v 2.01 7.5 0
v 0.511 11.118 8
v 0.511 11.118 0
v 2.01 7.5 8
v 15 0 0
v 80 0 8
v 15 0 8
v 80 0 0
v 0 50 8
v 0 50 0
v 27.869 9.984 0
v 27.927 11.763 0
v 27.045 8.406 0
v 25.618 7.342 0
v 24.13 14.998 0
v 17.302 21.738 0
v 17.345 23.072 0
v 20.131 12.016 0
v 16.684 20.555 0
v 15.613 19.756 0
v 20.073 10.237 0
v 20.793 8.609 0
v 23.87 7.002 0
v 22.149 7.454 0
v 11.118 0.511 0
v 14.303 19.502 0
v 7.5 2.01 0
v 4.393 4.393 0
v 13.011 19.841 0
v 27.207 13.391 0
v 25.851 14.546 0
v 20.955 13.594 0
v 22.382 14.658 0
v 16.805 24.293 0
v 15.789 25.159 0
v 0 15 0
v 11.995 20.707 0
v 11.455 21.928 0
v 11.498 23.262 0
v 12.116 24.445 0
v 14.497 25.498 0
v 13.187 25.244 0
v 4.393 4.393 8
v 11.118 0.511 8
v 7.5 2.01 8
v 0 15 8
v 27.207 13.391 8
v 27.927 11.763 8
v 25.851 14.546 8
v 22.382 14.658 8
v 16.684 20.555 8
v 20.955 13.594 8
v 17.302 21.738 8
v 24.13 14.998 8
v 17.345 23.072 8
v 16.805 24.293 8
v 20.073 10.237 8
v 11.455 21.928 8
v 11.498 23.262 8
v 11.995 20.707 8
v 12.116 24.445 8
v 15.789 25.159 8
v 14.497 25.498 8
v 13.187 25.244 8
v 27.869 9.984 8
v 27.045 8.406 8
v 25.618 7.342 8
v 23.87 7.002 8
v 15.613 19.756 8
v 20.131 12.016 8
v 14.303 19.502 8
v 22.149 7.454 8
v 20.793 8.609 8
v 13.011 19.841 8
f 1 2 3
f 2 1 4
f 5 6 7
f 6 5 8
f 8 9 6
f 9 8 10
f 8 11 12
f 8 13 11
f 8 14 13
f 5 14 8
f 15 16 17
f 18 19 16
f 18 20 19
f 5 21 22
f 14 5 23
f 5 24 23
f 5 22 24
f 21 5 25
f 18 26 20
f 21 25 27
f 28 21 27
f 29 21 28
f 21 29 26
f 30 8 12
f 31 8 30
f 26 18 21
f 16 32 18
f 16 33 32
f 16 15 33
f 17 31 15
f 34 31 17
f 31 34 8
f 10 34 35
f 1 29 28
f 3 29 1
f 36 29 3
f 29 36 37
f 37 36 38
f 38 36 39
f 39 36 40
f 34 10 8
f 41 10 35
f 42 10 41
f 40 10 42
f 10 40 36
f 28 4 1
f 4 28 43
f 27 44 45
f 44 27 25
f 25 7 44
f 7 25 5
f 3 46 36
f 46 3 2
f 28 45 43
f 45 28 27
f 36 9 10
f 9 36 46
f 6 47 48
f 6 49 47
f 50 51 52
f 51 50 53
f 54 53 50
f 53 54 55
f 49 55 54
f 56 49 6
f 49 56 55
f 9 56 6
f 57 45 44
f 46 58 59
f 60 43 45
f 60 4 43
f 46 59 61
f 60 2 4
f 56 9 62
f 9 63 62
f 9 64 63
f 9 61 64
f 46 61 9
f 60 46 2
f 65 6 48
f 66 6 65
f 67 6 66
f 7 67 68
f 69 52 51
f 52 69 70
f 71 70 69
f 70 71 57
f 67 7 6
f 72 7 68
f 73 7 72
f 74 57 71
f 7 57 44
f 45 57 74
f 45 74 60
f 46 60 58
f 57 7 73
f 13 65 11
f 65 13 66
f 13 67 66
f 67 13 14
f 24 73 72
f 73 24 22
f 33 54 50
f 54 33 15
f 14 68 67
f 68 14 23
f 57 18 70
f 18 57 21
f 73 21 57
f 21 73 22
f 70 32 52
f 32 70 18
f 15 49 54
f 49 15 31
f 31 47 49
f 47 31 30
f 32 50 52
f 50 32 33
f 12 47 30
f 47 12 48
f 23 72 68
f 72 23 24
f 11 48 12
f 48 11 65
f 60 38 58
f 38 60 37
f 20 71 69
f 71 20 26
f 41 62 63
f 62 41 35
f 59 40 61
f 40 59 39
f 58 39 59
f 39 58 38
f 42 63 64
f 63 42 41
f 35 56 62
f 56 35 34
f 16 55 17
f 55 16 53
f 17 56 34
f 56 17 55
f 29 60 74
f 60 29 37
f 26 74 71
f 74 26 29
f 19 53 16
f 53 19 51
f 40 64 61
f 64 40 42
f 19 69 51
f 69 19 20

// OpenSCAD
$fn = 32;

// ----------------------------------------------------------------------
// Bracket plate: corner pad 80 x 50, fillet R15
// ----------------------------------------------------------------------

// --- parameters (mm) ---
hole_r = 3;               // bolt hole radius
plate_t = 8;              // plate thickness, Z (extrusion height)
leg_a = 80;               // base leg
leg_b = 50;               // height leg
fillet_r = 15;            // right-angle fillet radius

hole_d1 = 2 * hole_r + 2;
hole_d2 = 2 * hole_r;

profile = [[15, 0], [80, 0], [0, 50], [0, 15], [0.511, 11.118], [2.01, 7.5], [4.393, 4.393], [7.5, 2.01], [11.118, 0.511]];  // primary outline, 9 points, counter clockwise
void_1 = [[27.927, 11.763], [27.207, 13.391], [25.851, 14.546], [24.13, 14.998], [22.382, 14.658], [20.955, 13.594], [20.131, 12.016], [20.073, 10.237], [20.793, 8.609], [22.149, 7.454], [23.87, 7.002], [25.618, 7.342], [27.045, 8.406], [27.869, 9.984]];  // mount hole 1, 14 points
void_2 = [[17.345, 23.072], [16.805, 24.293], [15.789, 25.159], [14.497, 25.498], [13.187, 25.244], [12.116, 24.445], [11.498, 23.262], [11.455, 21.928], [11.995, 20.707], [13.011, 19.841], [14.303, 19.502], [15.613, 19.756], [16.684, 20.555], [17.302, 21.738]];  // mount hole 2, 14 points

// --- the one profile operation ---
difference() {
  linear_extrude(height = plate_t) polygon(points = profile);
  translate([0, 0, -1])
    linear_extrude(height = plate_t + 2) polygon(points = void_1);
  translate([0, 0, -1])
    linear_extrude(height = plate_t + 2) polygon(points = void_2);
}
